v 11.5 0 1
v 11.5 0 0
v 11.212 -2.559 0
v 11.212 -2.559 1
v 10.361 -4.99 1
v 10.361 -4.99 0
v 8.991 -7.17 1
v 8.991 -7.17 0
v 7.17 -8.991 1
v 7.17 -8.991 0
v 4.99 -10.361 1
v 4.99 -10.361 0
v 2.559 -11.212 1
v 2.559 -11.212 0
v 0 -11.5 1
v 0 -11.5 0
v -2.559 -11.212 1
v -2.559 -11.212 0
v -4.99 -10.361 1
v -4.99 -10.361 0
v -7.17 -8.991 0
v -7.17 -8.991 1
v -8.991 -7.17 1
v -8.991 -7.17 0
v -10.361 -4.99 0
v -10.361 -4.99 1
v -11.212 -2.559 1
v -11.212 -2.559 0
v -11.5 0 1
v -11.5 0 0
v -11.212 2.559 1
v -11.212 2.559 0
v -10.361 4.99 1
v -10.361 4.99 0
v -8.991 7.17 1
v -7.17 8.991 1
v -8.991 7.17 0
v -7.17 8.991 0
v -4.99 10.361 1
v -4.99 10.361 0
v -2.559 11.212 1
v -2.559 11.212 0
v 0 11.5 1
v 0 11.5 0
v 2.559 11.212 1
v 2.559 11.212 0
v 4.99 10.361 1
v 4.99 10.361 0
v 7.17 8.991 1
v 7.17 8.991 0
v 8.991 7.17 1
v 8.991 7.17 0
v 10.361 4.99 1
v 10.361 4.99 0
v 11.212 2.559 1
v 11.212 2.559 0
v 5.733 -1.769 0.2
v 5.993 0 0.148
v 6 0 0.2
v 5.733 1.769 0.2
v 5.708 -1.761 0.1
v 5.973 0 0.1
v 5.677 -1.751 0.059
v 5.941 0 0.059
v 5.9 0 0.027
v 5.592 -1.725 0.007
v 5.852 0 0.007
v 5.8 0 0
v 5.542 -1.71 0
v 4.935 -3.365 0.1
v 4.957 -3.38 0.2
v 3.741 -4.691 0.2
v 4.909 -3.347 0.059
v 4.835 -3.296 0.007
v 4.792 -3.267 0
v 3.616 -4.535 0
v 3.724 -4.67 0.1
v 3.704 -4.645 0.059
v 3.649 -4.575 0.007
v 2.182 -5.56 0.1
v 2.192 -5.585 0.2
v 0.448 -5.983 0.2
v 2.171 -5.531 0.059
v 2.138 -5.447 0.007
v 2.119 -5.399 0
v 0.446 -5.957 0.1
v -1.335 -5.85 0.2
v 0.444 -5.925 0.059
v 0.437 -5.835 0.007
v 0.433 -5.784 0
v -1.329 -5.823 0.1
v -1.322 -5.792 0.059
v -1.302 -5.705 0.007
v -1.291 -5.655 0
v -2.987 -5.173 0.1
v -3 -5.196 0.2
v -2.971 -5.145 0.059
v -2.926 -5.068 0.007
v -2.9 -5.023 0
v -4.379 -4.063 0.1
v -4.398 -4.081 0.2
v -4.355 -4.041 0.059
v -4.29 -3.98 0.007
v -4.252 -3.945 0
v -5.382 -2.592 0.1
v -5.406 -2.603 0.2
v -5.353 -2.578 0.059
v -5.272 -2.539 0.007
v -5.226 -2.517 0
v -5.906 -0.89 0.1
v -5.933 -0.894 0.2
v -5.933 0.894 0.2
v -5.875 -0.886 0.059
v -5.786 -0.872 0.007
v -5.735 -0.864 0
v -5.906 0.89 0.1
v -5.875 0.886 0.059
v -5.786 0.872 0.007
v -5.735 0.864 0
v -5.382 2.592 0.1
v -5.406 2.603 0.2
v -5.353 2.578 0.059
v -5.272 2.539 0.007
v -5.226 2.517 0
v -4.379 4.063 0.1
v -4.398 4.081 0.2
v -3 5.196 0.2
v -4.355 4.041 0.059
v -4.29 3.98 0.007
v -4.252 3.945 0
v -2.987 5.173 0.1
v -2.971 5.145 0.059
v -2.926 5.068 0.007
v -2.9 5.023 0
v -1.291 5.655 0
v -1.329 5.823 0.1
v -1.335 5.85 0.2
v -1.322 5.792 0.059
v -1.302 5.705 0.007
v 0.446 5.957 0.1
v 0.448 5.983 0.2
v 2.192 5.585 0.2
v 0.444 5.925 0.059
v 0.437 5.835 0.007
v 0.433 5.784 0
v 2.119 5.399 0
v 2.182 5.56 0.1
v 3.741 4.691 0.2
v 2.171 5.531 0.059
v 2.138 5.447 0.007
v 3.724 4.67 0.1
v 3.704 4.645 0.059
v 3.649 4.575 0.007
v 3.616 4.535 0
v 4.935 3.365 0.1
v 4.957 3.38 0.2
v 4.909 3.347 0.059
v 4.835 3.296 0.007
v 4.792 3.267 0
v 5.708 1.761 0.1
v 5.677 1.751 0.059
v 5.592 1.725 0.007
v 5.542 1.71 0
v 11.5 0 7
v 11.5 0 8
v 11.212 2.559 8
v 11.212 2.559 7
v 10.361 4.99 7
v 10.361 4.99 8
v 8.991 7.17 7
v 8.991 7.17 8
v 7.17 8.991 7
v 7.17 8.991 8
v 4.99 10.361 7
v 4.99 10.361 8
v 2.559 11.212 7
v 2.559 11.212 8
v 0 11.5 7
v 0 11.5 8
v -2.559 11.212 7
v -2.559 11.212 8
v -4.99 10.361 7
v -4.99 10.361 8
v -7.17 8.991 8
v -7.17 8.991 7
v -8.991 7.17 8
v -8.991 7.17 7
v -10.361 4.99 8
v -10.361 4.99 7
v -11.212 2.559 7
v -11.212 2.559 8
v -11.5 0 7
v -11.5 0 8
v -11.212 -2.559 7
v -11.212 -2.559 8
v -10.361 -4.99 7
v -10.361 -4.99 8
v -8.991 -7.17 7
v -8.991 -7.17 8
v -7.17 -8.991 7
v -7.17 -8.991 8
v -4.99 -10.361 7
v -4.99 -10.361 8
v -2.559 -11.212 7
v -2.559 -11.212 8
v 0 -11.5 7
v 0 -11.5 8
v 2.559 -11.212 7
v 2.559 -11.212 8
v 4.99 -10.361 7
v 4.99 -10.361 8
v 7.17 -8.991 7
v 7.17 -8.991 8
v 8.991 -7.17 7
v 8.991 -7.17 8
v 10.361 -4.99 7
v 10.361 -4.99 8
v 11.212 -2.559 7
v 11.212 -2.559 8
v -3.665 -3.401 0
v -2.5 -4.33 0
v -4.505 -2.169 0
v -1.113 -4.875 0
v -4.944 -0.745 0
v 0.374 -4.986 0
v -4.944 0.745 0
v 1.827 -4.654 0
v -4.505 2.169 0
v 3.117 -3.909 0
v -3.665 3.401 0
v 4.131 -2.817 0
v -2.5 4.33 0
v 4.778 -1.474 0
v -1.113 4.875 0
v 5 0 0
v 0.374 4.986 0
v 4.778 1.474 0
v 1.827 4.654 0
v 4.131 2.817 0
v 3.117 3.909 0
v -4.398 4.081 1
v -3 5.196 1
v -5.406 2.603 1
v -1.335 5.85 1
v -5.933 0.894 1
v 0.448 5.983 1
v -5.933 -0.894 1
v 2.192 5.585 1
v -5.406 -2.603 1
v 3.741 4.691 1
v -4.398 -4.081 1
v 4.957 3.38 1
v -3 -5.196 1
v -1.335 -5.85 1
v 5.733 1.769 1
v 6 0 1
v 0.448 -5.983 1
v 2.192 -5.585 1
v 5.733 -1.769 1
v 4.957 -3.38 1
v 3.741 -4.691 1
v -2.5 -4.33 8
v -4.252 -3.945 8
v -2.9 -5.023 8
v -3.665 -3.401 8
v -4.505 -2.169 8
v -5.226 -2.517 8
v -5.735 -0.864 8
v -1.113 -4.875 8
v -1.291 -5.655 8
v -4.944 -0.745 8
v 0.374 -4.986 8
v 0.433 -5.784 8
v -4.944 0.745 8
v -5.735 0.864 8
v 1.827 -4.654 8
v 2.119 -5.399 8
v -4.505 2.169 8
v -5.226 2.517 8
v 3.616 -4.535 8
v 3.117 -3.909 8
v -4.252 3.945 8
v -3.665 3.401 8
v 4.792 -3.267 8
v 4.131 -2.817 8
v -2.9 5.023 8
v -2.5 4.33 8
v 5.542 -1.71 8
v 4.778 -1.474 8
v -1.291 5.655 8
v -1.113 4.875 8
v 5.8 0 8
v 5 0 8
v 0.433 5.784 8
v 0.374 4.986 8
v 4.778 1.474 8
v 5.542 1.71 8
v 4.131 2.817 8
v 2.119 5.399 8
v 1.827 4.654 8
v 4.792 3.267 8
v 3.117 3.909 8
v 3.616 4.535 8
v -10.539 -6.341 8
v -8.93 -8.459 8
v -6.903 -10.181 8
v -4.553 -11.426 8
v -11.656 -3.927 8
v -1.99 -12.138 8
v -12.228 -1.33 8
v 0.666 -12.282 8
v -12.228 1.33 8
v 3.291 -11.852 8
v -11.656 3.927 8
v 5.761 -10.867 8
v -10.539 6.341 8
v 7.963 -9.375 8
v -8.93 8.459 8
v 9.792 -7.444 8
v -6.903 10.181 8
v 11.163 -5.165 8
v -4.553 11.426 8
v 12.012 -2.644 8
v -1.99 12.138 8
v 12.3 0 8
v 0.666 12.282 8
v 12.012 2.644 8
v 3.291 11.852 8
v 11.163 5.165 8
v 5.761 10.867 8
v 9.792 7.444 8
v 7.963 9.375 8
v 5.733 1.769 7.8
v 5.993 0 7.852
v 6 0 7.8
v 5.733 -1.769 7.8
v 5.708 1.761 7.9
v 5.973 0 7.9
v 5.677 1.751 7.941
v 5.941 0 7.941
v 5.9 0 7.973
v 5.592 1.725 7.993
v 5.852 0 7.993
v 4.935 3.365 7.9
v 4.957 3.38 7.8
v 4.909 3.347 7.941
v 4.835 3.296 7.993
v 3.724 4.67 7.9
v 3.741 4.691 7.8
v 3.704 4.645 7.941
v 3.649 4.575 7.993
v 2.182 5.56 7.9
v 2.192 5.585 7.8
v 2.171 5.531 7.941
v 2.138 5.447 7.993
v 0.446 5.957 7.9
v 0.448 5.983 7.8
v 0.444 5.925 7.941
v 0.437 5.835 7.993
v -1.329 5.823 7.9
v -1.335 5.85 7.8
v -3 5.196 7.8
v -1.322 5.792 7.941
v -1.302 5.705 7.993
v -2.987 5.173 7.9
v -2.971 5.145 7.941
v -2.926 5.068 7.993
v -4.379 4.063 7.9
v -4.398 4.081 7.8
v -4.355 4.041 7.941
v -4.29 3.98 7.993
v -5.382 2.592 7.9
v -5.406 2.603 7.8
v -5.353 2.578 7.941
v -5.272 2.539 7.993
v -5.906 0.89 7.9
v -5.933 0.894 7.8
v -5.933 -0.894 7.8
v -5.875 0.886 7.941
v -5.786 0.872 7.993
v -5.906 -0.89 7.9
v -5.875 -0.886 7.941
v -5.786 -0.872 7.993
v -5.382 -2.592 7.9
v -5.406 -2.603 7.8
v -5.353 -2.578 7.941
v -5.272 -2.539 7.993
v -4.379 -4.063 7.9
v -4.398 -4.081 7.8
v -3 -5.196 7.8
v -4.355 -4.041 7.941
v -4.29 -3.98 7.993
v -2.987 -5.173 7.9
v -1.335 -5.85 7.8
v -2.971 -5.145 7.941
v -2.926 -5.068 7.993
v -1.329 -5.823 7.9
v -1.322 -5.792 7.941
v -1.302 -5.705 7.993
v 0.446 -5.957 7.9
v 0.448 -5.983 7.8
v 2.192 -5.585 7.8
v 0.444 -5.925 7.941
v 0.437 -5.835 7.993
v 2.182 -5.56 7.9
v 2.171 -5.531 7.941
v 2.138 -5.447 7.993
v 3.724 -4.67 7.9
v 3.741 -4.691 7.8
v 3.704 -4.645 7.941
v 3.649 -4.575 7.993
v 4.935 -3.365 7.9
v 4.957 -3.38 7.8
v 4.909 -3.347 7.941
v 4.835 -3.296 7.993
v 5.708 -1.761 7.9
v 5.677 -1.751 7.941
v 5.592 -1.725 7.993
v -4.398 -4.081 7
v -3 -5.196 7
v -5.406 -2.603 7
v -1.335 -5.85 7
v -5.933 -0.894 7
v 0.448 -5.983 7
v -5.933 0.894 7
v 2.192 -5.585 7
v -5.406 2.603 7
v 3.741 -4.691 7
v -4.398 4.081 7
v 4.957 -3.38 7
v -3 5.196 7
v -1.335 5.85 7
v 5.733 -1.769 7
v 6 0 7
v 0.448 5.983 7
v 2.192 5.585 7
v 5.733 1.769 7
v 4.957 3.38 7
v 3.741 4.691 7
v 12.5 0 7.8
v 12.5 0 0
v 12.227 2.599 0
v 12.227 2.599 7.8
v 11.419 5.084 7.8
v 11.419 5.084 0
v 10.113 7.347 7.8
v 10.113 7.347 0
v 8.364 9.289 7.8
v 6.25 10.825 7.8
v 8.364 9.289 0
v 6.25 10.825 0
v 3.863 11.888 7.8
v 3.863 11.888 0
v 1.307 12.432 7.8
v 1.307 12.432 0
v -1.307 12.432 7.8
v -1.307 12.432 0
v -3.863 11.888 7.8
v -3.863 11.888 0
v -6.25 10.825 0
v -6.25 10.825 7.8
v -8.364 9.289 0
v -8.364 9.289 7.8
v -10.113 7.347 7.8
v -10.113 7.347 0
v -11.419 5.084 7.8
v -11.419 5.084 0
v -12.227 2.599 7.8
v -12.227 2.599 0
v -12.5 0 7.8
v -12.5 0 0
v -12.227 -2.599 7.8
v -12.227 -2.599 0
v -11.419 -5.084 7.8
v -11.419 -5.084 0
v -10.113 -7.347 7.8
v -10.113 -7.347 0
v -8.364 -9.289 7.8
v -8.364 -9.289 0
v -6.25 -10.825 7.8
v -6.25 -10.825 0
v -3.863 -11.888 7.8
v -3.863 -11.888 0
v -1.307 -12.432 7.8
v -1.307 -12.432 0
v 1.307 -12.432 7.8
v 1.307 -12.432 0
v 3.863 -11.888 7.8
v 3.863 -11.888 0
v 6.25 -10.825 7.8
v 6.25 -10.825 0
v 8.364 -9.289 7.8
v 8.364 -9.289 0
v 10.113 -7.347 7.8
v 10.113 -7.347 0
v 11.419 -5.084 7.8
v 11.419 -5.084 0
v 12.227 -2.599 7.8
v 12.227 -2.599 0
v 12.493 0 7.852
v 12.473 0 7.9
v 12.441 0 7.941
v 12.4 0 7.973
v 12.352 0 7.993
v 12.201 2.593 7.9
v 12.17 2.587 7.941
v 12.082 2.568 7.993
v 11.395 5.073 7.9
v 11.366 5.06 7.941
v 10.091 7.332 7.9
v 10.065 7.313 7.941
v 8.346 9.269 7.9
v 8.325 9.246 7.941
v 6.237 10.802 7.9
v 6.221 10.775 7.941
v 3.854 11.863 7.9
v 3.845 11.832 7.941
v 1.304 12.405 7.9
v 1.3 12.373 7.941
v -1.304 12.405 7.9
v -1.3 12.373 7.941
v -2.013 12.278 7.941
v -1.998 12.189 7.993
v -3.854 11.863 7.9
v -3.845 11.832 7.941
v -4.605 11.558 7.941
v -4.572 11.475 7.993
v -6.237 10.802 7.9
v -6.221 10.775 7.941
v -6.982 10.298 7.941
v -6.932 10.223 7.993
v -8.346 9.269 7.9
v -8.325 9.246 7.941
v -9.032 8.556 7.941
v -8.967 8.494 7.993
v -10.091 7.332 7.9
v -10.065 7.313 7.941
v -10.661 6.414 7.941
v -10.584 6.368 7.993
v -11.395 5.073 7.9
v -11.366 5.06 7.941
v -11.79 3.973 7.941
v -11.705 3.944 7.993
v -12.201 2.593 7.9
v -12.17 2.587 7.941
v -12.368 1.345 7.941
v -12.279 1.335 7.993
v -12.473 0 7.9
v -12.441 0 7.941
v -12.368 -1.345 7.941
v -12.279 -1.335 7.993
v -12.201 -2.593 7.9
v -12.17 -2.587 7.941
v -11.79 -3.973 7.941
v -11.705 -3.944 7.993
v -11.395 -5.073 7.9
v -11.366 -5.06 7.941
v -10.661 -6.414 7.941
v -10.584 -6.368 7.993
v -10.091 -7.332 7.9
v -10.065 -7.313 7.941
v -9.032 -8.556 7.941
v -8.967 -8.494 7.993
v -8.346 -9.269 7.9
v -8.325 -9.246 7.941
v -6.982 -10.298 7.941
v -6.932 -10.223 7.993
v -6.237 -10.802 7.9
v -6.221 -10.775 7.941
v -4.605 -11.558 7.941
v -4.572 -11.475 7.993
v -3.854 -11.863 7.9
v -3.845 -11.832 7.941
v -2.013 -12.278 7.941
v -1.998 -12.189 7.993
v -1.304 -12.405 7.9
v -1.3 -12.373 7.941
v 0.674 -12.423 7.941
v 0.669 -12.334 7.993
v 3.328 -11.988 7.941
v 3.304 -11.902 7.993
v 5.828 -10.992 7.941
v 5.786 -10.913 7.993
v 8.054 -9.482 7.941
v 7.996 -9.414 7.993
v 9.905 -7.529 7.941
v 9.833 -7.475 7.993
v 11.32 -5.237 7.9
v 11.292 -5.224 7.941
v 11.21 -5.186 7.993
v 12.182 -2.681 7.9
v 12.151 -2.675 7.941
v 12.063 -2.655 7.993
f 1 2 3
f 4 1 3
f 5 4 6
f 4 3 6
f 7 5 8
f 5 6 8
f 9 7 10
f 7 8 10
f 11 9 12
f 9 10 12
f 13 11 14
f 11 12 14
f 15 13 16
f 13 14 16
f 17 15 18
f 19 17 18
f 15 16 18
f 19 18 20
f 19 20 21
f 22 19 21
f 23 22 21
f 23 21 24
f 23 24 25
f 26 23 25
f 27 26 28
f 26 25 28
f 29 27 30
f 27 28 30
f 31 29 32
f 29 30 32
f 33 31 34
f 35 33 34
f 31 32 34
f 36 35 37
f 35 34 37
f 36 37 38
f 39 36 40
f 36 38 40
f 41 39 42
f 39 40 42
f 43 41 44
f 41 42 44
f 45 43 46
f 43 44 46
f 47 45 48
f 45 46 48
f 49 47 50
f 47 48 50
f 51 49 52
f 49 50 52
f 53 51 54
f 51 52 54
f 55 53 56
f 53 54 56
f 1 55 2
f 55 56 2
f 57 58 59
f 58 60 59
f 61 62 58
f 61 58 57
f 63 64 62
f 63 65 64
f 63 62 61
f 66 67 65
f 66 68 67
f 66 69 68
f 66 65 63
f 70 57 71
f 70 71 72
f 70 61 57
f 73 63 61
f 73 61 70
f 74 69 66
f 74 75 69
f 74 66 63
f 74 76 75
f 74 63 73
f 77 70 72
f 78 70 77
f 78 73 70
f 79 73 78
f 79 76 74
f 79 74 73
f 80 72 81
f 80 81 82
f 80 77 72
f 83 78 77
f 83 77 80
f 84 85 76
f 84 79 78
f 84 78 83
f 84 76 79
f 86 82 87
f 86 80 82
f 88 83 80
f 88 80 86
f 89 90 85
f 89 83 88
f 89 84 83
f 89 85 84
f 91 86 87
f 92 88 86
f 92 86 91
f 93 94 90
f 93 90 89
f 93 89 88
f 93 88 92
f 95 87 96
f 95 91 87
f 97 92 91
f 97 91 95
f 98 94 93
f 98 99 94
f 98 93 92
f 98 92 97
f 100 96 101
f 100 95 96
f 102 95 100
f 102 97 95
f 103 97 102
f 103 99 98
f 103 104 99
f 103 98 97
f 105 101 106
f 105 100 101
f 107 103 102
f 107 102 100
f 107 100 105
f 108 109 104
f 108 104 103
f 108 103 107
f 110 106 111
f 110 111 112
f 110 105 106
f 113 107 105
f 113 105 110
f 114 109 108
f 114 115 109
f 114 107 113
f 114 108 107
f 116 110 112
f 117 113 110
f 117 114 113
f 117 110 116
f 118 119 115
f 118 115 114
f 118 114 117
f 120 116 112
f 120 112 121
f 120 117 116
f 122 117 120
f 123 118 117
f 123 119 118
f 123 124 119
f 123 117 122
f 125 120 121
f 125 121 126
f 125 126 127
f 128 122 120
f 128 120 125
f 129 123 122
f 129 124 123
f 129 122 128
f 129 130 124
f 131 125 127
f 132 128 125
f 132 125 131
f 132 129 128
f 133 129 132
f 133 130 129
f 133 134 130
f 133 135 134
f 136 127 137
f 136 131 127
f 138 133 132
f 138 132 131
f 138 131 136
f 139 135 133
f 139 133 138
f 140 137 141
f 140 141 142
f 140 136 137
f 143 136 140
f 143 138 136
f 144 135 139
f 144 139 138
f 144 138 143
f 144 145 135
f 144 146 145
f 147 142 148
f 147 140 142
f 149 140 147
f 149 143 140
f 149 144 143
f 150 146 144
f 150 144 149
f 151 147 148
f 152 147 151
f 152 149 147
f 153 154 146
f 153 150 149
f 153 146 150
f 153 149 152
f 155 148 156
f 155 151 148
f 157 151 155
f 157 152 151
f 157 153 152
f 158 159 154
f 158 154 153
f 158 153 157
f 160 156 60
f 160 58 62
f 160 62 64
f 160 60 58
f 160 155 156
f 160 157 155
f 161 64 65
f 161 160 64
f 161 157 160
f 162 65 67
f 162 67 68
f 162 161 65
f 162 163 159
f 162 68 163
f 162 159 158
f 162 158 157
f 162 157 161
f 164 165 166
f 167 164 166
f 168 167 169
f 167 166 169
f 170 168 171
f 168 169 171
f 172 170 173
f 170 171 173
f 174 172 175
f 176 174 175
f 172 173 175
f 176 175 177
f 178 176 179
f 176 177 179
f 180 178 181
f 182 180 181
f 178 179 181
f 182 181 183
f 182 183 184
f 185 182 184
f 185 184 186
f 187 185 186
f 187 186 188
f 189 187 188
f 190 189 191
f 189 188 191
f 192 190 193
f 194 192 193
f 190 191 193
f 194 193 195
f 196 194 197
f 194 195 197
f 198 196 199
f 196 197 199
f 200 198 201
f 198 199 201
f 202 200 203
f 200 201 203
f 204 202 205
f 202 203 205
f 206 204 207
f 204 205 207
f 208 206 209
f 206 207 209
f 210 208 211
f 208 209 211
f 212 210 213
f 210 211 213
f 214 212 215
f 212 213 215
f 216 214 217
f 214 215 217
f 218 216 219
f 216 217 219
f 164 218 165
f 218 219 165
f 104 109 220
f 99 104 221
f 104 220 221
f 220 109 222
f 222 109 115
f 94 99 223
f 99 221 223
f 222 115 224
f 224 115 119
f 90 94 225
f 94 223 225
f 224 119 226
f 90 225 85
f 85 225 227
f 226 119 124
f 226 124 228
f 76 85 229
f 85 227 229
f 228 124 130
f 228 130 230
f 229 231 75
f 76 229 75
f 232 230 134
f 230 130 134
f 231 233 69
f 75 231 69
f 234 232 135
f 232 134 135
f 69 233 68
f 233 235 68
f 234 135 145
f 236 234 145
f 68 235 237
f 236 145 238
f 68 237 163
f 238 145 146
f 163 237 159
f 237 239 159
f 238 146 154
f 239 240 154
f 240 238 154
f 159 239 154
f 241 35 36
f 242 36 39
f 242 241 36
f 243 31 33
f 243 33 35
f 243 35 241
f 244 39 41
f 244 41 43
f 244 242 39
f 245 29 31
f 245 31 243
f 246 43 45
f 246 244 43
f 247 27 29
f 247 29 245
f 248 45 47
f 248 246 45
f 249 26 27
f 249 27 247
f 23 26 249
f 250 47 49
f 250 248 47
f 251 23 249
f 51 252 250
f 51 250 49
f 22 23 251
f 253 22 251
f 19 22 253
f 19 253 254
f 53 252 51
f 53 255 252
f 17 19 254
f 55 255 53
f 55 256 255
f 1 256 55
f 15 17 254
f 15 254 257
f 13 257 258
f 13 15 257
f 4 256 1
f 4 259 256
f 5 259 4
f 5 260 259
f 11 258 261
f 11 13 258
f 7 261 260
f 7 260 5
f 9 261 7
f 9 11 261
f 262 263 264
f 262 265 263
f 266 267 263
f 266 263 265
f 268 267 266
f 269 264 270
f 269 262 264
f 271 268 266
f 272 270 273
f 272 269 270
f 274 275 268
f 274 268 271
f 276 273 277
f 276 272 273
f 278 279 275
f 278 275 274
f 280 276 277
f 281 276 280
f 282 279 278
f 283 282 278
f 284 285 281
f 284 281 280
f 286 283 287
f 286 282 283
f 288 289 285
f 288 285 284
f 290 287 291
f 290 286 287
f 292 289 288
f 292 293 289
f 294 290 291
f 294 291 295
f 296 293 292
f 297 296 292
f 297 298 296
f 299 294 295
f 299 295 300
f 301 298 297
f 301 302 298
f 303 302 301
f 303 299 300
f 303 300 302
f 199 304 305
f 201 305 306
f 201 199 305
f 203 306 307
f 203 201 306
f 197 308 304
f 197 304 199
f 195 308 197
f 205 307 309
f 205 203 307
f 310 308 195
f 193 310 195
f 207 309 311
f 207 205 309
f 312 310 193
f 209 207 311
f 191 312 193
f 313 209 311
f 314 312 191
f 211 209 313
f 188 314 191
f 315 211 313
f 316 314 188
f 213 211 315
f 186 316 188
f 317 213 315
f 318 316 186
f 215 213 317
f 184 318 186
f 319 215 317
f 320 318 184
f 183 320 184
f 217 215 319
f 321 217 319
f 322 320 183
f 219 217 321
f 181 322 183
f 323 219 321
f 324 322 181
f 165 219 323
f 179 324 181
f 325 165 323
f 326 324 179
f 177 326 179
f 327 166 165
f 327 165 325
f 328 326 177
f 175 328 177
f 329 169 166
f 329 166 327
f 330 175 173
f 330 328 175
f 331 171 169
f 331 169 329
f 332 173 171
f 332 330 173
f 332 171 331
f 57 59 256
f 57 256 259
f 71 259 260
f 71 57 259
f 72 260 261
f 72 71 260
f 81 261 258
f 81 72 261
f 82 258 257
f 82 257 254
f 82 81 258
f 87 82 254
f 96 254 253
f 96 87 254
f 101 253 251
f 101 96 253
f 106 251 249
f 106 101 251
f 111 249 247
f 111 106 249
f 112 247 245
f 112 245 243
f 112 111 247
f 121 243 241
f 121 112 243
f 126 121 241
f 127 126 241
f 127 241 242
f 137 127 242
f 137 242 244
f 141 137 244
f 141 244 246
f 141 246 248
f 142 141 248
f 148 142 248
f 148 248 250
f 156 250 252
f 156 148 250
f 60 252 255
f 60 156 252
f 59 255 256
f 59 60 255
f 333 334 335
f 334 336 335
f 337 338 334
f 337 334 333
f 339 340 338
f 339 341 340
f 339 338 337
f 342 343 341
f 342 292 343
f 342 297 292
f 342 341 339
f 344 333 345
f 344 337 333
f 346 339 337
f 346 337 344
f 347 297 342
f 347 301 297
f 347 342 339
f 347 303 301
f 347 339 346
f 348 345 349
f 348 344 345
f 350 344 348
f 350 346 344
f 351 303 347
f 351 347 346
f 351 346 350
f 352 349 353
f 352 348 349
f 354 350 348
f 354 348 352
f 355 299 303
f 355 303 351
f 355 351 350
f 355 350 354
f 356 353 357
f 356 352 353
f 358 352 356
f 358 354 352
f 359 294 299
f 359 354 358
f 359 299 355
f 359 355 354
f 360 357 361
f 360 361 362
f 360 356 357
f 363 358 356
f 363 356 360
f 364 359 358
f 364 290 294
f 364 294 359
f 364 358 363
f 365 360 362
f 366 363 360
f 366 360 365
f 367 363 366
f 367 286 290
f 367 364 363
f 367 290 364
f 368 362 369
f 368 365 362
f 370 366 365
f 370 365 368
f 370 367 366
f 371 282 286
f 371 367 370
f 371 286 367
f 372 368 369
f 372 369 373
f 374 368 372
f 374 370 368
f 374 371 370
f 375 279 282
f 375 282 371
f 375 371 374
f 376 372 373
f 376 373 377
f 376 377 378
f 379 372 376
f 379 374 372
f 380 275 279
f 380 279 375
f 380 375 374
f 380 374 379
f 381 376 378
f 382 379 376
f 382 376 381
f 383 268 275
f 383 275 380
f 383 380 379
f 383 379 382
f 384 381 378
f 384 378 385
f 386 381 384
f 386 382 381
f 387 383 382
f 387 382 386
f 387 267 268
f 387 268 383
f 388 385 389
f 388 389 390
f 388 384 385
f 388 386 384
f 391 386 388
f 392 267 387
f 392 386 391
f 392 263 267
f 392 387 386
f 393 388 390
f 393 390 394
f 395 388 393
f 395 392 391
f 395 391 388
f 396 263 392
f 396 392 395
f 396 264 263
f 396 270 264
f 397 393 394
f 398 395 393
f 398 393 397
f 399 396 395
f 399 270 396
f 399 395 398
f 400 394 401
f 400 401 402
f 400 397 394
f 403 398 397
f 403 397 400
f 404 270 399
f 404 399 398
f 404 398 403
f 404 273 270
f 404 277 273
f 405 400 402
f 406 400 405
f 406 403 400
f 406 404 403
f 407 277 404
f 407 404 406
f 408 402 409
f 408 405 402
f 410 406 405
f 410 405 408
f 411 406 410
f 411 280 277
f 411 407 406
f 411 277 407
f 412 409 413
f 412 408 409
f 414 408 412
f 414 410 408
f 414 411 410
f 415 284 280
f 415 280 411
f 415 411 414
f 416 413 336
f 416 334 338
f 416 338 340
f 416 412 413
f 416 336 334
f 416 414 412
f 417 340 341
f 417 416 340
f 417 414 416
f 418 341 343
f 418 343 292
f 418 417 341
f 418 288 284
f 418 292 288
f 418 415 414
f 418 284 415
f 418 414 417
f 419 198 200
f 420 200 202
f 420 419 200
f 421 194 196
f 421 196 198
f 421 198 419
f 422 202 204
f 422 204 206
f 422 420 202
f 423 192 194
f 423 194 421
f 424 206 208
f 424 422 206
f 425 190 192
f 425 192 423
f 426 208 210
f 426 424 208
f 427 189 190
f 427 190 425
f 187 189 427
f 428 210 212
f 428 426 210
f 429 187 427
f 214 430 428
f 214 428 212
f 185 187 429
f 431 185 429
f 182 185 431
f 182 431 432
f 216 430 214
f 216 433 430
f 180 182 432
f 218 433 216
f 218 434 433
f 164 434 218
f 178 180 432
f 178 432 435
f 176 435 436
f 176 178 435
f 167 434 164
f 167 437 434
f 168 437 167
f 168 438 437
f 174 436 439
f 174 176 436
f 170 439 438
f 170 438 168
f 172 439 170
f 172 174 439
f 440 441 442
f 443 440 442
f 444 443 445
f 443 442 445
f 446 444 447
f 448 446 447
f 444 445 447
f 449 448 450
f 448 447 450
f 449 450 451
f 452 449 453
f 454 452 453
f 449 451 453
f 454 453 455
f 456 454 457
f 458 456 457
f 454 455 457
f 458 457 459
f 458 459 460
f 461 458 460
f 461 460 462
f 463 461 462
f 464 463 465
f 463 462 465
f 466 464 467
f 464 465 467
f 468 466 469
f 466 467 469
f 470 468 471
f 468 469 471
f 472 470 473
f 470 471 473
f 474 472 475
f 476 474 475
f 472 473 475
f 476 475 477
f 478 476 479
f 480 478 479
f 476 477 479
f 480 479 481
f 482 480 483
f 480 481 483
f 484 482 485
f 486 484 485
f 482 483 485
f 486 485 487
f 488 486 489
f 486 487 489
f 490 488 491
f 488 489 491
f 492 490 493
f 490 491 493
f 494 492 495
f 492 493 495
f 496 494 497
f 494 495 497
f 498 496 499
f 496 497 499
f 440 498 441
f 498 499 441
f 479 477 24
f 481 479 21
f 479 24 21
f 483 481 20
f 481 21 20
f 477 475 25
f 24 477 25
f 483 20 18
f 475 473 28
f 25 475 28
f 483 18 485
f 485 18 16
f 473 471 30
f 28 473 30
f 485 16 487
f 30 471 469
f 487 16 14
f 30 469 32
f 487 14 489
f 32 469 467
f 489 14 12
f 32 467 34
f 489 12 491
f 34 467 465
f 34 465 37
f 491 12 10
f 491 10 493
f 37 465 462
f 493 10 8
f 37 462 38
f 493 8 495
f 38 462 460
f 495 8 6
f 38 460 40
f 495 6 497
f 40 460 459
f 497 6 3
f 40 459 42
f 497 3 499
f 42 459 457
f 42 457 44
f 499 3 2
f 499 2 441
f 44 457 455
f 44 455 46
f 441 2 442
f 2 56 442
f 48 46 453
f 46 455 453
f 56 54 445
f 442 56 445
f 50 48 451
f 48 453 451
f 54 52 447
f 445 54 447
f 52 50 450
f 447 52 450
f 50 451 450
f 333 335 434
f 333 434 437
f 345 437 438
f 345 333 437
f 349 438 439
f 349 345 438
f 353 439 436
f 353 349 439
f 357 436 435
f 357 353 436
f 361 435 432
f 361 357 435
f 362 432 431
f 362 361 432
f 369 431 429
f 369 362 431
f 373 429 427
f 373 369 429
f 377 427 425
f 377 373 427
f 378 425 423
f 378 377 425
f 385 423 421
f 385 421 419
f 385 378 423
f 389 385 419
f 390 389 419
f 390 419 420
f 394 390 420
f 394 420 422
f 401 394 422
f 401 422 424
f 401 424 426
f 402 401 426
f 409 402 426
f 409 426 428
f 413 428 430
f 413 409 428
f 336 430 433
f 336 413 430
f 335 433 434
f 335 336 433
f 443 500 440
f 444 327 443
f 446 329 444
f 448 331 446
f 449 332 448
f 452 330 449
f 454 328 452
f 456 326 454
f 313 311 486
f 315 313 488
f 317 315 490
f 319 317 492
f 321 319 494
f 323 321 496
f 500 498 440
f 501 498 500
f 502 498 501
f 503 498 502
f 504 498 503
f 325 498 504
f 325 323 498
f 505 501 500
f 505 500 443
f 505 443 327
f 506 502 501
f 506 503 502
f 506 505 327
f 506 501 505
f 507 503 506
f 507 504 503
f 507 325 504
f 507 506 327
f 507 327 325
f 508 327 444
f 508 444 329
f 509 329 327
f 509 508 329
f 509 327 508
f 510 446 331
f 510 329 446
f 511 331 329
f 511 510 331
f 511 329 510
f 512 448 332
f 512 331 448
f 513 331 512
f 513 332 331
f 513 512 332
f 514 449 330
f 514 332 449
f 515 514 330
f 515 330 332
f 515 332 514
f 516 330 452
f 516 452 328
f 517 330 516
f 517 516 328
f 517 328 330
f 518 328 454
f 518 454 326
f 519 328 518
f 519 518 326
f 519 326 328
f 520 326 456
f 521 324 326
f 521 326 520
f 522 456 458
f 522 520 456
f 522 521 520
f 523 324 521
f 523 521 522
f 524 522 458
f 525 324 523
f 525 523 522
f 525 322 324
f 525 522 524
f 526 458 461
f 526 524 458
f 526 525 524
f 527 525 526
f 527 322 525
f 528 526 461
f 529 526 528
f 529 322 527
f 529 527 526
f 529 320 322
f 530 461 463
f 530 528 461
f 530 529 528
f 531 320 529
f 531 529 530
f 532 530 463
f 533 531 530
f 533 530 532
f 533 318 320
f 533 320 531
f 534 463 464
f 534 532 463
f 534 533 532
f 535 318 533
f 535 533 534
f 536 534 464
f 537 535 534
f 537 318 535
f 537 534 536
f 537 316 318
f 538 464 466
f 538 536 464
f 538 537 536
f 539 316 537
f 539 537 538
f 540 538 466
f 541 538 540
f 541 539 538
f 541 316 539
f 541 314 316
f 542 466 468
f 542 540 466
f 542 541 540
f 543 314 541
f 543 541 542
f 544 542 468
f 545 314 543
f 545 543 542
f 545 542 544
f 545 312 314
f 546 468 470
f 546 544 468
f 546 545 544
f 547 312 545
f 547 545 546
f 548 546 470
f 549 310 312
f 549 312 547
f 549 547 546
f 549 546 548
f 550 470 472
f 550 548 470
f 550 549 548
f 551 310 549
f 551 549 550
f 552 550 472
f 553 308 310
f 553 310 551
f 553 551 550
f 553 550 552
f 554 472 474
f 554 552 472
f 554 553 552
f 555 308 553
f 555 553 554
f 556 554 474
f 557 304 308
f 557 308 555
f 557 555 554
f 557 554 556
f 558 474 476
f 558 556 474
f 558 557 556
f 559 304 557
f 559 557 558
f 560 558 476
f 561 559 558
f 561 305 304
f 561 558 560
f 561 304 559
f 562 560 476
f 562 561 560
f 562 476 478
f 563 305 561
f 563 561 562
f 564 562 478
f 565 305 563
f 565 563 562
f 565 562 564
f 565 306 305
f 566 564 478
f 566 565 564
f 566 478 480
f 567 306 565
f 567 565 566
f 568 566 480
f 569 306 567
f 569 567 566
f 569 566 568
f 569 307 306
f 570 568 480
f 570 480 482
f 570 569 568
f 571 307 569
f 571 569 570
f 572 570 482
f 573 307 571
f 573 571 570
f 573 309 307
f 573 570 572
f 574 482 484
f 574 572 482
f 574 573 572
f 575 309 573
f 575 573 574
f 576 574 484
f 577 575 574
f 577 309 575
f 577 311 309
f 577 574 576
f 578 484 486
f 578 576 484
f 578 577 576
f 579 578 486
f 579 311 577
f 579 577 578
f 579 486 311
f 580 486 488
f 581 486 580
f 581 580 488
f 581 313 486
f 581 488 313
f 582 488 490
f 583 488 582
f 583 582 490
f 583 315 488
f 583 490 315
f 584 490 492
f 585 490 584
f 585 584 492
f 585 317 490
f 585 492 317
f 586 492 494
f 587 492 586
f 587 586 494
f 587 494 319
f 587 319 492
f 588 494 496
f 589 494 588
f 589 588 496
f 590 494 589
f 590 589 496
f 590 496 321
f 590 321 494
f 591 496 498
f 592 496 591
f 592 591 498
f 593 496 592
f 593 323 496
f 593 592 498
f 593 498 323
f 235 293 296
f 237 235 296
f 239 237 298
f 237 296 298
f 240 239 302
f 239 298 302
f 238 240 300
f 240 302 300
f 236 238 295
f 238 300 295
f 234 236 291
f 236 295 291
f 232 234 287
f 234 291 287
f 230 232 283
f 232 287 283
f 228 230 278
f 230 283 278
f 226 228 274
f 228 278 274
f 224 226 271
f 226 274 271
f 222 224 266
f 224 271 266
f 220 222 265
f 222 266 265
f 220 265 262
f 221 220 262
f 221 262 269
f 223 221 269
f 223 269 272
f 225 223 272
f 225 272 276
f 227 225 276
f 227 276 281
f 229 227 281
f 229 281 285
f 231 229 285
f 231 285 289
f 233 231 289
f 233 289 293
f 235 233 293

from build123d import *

# Parameters (mm, degrees)
F0_R     = 12.5
F1_DEPTH = 8
F2_R     = 5
F3_DEPTH = 8.001
F4_R     = 11.5
F4_R_2   = 6
F5_DEPTH = 1
F6_R     = 11.5
F6_R_2   = 6
F7_DEPTH = 1
F8_R     = 0.2


with BuildPart() as f1:
    # F0 (on Top) → F1 (new body)
    with BuildSketch(Plane.XY):
        Circle(F0_R)
    extrude(amount=F1_DEPTH)

    # F2 (on face) → F3 (cut, through all)
    with BuildSketch(Plane.XY.offset(8)):
        Circle(F2_R)
    extrude(amount=-F3_DEPTH, mode=Mode.SUBTRACT)

    # F4 (on face) → F5 (cut)
    with BuildSketch(Plane.XY.offset(8)):
        Circle(F4_R)
        Circle(F4_R_2, mode=Mode.SUBTRACT)
    extrude(amount=-F5_DEPTH, mode=Mode.SUBTRACT)

    # F6 (on face) → F7 (cut)
    with BuildSketch(Plane(origin=(0, 0, 0), x_dir=(1, 0, 0), z_dir=(0, 0, -1))):
        Circle(F6_R)
        Circle(F6_R_2, mode=Mode.SUBTRACT)
    extrude(amount=-F7_DEPTH, mode=Mode.SUBTRACT)

    # F8
    f8_edges = [f1.edges().sort_by_distance(p)[0] for p in [
        (-12.5, 0, 8),
        (-6, 0, 8),
        (-6, 0, 0),
    ]]
    fillet(f8_edges, radius=F8_R)


solid = f1.part
